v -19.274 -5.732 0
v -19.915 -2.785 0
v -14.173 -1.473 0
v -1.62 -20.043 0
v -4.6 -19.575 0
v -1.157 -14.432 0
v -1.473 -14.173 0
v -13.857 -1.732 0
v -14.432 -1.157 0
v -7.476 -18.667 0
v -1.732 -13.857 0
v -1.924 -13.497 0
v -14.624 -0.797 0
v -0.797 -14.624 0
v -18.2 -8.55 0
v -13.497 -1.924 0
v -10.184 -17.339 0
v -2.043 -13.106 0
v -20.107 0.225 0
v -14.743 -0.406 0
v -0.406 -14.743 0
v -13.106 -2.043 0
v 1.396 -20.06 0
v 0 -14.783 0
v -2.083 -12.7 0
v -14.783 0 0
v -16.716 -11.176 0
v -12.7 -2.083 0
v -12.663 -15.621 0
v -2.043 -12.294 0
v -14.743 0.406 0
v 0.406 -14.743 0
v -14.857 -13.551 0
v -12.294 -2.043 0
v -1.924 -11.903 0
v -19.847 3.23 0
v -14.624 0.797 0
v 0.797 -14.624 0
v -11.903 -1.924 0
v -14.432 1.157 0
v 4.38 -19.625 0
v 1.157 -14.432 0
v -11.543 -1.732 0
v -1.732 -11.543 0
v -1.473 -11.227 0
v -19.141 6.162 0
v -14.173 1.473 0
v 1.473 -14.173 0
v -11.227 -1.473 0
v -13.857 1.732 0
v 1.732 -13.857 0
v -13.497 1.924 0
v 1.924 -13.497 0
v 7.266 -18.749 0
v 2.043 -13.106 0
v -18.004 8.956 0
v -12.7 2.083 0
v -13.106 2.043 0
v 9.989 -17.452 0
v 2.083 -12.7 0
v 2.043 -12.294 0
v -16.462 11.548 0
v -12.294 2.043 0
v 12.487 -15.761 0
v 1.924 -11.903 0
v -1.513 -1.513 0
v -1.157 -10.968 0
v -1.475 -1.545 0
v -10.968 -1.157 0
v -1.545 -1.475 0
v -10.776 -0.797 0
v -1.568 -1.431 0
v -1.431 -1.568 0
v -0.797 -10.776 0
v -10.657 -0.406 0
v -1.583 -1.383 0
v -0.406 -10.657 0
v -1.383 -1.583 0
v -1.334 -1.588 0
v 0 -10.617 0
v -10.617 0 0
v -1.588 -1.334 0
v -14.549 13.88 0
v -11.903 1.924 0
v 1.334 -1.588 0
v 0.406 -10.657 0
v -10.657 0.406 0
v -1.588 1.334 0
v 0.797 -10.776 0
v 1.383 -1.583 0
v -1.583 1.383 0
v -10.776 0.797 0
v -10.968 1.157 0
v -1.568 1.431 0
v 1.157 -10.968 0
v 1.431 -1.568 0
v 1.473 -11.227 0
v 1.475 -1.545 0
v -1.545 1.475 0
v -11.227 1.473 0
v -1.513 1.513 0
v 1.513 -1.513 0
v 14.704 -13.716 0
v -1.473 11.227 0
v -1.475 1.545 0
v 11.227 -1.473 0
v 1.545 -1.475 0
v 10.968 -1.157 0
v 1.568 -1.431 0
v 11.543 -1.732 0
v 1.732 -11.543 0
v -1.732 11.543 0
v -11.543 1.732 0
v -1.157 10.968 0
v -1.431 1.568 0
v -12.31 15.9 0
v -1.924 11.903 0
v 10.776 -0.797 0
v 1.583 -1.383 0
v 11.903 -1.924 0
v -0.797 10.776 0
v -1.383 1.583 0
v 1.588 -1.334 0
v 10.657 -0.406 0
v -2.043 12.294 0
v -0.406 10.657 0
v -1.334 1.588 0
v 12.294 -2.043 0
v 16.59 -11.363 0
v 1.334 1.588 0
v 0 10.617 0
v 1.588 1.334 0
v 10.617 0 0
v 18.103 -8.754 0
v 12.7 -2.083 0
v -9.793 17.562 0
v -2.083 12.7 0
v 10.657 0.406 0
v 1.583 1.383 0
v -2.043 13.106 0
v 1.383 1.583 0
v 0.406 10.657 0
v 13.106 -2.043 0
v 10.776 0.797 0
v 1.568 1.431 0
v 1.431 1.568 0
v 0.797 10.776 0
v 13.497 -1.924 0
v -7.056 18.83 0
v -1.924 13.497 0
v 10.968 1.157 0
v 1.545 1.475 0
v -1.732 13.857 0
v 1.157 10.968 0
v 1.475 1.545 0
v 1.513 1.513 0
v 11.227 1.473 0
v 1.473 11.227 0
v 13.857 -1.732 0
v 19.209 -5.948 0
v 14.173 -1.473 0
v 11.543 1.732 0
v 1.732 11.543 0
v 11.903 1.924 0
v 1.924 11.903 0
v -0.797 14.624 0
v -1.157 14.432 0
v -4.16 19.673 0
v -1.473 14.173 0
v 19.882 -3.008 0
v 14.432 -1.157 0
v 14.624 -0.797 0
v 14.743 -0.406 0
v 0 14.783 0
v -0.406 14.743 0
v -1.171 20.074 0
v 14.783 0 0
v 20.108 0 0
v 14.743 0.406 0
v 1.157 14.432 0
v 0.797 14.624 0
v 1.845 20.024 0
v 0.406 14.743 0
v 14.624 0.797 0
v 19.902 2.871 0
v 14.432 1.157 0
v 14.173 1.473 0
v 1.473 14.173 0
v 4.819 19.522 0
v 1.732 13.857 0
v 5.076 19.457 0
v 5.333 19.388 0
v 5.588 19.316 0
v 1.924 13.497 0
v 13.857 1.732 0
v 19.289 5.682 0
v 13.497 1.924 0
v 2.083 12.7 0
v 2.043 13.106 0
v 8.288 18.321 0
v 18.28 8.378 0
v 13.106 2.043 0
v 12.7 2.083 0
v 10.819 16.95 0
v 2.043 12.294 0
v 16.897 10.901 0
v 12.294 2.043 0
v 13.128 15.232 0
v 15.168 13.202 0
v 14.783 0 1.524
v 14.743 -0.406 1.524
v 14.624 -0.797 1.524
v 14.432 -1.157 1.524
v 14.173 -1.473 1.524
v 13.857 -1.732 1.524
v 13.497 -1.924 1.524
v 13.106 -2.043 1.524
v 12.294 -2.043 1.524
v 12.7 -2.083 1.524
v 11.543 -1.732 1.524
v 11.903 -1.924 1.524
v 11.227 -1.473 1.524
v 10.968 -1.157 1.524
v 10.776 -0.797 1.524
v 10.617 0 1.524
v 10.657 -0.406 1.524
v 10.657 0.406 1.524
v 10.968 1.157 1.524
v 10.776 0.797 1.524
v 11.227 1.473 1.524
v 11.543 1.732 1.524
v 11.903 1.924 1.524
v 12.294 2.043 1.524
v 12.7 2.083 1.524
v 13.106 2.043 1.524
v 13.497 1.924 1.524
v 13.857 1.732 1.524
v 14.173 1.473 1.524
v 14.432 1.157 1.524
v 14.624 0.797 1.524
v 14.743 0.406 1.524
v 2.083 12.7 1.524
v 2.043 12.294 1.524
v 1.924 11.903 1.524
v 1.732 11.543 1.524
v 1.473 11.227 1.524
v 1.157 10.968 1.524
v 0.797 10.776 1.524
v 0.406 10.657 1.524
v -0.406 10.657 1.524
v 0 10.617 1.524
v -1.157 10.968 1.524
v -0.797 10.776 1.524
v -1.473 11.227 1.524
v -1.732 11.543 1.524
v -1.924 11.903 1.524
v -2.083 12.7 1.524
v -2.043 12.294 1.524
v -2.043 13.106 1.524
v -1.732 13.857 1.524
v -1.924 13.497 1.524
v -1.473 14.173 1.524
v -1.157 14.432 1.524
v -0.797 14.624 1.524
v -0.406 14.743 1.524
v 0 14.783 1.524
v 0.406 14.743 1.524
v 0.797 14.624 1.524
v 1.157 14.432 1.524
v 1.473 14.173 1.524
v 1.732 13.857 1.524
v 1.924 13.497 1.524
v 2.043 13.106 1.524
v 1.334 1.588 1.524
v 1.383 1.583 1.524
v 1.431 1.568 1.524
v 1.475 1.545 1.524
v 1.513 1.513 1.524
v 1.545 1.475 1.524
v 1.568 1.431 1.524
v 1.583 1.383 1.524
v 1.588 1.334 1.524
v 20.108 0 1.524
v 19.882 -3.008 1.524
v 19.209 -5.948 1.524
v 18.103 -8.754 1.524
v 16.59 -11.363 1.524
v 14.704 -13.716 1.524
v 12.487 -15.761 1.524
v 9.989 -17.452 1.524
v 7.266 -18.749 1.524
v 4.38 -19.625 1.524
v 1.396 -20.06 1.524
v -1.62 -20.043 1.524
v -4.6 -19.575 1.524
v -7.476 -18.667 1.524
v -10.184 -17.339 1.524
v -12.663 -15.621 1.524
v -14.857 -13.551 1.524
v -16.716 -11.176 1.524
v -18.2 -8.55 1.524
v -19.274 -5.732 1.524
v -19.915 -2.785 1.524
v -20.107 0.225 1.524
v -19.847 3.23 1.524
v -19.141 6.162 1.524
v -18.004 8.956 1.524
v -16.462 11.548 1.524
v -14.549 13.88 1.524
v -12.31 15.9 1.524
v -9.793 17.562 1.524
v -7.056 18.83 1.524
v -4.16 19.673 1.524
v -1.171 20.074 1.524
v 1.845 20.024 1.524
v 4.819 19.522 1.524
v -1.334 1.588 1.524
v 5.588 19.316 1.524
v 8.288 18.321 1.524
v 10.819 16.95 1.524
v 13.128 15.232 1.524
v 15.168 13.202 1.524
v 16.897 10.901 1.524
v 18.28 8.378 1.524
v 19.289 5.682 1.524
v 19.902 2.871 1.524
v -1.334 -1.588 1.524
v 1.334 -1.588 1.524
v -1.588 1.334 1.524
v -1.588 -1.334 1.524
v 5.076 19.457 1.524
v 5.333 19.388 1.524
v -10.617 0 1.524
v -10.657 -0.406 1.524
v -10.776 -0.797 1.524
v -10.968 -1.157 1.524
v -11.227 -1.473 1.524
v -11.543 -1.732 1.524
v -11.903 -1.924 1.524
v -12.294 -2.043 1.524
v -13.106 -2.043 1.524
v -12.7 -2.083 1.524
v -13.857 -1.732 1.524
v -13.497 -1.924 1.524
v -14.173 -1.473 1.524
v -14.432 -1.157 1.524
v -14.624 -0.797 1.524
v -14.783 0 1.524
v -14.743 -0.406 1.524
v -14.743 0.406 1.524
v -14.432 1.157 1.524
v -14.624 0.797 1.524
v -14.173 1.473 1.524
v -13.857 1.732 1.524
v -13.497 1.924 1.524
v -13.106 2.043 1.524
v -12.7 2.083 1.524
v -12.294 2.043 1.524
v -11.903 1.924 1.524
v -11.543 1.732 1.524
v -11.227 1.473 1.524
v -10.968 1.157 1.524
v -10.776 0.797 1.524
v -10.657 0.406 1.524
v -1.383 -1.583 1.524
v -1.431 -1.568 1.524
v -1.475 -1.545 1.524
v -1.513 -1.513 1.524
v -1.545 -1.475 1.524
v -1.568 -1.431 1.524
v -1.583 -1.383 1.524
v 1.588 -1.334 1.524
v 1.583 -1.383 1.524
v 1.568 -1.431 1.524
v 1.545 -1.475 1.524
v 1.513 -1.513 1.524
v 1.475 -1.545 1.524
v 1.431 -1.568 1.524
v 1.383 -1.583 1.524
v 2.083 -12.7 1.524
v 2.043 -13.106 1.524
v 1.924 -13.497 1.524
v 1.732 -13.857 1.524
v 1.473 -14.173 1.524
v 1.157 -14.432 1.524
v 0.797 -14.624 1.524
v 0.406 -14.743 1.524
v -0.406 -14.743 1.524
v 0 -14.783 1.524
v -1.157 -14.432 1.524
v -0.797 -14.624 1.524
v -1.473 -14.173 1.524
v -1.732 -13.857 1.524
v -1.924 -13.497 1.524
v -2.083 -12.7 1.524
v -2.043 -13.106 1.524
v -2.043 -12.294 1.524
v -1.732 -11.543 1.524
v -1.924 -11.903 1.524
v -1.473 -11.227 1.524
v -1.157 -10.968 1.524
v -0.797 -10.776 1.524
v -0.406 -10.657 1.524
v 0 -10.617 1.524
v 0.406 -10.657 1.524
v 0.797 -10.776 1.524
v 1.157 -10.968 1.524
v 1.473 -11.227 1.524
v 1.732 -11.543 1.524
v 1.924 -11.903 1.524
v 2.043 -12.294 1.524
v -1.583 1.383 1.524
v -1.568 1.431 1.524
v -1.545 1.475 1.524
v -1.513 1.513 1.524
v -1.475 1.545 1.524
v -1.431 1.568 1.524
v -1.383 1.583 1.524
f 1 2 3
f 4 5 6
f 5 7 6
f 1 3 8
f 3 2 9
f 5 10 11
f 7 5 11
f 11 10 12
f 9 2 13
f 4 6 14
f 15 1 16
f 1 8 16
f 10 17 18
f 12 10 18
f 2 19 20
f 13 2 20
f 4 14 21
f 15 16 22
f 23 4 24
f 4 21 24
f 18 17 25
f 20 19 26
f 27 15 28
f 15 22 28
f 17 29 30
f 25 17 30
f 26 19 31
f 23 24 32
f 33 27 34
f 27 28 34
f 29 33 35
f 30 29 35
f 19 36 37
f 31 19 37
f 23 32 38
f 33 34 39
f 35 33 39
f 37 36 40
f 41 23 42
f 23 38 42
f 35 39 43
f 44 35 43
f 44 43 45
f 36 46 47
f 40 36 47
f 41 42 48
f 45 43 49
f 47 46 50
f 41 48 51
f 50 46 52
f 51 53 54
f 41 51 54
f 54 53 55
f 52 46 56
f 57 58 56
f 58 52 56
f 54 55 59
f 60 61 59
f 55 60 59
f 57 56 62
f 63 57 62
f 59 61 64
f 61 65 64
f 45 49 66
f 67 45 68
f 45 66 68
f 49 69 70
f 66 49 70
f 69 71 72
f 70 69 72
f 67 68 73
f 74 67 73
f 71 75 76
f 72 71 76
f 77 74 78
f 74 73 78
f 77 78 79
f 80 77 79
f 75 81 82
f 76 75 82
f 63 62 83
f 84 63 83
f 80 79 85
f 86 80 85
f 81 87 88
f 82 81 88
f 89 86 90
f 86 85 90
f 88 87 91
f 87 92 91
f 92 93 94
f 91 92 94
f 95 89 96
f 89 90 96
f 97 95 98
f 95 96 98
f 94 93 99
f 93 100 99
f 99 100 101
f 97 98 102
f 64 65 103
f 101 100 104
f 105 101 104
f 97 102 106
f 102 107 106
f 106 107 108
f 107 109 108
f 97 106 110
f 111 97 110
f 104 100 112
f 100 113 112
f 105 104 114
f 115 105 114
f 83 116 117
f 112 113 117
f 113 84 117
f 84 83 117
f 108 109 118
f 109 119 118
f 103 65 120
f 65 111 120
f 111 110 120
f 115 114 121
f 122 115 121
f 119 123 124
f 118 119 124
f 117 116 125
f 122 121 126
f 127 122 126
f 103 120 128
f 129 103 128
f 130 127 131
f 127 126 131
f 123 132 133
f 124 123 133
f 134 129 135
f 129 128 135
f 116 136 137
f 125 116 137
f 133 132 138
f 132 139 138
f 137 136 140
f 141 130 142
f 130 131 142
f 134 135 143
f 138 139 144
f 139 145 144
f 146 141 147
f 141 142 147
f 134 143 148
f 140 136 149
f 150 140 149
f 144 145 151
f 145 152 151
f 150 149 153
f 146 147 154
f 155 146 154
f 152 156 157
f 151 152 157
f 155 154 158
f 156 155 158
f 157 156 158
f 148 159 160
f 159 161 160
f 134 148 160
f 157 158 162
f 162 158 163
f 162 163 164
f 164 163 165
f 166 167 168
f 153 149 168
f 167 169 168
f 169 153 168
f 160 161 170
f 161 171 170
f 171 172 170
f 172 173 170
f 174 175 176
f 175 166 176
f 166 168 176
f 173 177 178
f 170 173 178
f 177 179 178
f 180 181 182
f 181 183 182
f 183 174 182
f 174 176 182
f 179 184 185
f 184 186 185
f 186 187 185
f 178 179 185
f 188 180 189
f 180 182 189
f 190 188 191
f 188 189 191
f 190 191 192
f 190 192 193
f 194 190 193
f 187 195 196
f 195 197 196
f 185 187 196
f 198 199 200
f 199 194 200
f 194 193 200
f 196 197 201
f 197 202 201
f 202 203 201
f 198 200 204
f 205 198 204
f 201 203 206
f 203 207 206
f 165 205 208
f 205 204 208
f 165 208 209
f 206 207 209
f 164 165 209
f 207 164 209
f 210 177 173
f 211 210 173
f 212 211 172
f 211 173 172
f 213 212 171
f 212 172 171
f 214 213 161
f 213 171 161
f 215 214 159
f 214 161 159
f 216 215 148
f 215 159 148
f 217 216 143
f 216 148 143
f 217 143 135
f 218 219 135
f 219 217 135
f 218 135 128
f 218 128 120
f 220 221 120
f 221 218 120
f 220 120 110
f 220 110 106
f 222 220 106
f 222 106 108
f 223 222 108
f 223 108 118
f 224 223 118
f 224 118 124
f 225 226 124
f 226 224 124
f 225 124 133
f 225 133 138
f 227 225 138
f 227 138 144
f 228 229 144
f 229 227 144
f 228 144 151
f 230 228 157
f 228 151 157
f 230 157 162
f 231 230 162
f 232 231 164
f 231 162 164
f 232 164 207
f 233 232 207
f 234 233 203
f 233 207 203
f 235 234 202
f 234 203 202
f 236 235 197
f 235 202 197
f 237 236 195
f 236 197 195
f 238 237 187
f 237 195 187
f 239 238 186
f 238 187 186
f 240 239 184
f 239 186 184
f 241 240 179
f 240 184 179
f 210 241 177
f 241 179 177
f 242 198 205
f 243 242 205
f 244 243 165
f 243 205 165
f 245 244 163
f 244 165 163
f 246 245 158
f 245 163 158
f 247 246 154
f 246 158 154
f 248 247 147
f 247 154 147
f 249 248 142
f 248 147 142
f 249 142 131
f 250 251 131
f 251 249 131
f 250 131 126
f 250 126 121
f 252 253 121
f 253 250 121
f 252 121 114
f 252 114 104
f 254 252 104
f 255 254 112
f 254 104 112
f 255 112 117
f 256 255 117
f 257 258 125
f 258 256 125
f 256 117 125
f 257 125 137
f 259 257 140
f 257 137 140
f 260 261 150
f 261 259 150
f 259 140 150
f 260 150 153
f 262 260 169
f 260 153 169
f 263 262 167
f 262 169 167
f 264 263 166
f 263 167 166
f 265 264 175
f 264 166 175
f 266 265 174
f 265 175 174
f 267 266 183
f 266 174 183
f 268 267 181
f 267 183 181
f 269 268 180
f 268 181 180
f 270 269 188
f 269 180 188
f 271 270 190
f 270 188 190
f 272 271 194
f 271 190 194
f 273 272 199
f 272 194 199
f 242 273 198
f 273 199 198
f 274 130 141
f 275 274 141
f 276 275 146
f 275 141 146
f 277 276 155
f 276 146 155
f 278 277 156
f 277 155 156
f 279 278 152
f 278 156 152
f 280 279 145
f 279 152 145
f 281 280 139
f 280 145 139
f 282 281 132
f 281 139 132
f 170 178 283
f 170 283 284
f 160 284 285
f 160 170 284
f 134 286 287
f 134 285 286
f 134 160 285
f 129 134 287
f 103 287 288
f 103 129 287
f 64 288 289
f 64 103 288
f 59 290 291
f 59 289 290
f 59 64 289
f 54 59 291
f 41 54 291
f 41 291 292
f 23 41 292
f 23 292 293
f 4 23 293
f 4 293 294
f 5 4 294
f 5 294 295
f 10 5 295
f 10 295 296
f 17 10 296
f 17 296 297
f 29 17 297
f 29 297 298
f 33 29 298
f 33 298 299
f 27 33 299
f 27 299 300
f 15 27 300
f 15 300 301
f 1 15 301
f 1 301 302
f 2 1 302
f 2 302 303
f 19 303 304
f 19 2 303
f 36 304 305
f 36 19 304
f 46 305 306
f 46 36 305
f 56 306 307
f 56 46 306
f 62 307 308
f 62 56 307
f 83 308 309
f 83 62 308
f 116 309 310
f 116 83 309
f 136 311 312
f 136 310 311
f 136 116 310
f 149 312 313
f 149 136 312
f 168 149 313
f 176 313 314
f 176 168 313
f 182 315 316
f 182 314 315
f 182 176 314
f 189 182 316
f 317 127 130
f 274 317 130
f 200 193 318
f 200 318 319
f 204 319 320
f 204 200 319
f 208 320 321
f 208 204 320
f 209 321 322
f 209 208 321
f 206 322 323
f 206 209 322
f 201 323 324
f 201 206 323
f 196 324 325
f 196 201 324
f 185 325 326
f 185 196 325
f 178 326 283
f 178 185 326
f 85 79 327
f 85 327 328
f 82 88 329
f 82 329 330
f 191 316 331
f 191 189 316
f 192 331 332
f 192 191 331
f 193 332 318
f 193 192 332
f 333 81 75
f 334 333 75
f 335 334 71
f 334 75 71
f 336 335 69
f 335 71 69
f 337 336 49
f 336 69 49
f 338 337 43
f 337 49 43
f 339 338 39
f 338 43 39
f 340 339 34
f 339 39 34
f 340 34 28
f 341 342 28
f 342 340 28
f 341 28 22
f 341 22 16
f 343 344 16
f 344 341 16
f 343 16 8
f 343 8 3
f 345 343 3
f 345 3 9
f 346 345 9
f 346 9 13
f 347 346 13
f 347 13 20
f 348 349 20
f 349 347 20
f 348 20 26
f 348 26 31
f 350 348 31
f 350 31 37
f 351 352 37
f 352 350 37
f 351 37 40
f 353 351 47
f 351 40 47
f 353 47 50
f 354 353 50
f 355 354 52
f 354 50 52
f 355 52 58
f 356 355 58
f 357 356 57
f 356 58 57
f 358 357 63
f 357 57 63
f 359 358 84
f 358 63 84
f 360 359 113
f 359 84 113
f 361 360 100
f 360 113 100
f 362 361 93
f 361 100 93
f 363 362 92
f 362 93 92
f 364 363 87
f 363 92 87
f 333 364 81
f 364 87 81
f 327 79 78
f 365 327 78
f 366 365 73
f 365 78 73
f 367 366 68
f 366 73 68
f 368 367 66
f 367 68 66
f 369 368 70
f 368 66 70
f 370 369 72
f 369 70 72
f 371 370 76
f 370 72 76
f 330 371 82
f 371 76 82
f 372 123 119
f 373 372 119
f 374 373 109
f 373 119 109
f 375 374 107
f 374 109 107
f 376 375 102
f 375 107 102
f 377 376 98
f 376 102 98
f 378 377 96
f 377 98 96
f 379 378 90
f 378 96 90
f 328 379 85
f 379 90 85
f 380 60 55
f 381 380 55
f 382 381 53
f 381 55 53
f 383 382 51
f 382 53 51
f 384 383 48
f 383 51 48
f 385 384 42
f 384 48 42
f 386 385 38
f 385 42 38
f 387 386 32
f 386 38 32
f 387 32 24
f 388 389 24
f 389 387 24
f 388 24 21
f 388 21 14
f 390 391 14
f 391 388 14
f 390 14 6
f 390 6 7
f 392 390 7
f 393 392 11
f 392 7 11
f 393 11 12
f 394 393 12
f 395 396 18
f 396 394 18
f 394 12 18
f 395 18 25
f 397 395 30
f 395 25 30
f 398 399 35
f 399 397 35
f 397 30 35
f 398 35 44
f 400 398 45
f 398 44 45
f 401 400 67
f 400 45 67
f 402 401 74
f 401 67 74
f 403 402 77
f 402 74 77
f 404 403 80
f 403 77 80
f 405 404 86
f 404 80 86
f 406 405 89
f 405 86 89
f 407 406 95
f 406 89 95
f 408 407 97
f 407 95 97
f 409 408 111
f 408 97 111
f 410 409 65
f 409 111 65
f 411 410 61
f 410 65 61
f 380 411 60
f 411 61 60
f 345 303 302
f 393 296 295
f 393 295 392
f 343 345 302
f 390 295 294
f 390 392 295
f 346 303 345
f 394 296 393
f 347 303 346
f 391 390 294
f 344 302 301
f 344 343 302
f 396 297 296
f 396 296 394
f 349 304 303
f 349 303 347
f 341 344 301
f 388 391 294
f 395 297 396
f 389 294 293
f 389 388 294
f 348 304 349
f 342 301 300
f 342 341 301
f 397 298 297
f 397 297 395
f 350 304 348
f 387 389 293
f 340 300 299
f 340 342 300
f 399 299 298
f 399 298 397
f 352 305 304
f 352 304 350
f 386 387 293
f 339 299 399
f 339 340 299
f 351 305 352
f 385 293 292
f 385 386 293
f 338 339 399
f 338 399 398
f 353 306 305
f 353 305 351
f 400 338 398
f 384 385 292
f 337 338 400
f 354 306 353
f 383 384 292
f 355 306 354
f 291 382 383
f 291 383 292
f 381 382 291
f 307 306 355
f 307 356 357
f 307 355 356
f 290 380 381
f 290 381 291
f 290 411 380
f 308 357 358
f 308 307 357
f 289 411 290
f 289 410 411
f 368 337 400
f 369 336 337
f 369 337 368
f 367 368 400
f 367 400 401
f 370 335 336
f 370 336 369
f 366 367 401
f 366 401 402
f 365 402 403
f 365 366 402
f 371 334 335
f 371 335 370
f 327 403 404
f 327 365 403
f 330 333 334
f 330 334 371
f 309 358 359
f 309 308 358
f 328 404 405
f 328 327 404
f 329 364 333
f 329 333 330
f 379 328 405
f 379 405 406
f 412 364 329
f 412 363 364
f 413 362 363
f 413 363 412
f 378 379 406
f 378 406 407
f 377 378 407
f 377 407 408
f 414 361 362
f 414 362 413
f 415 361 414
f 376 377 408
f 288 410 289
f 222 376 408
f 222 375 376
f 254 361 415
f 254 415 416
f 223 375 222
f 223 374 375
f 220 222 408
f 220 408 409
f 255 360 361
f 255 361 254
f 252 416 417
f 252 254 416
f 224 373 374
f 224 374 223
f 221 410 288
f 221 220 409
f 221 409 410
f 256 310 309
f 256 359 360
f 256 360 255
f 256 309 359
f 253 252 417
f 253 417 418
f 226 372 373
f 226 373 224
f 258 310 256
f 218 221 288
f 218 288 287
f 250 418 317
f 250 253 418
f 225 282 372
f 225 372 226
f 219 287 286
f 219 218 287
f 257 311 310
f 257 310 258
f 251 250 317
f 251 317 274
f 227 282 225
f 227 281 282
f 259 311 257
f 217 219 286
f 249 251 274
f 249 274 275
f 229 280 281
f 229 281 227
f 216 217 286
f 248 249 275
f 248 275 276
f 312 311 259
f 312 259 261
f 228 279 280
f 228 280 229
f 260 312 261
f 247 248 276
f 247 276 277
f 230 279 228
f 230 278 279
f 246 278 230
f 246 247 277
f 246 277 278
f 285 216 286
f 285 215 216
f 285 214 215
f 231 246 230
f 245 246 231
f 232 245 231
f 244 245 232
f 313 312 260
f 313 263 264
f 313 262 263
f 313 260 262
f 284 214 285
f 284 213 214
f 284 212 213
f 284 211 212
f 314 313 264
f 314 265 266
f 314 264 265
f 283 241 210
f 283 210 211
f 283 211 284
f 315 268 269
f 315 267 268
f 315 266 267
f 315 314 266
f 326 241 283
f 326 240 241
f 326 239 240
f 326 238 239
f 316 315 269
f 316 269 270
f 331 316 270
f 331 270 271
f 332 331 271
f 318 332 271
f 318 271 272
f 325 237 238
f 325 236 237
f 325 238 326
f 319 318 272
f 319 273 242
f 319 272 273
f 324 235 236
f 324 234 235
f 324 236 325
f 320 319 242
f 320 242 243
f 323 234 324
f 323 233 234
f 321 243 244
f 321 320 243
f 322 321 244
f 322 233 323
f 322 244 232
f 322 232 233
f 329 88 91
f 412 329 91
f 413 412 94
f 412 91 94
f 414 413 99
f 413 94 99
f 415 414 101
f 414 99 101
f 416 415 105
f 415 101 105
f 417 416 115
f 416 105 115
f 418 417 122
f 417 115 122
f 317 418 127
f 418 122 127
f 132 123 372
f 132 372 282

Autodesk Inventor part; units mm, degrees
ref_plane "YZ Plane" through (0, 0, 0) normal (1, 0, 0) x (0, 1, 0)
ref_plane "XZ Plane" through (0, 0, 0) normal (0, 1, 0) x (-1, 0, 0)
ref_plane "XY Plane" through (0, 0, 0) normal (0, 0, 1) x (1, 0, 0)
sketch "Sketch1" plane through (0, 0, 0) normal (0, 0, 1) x (1, 0, 0)
  circle A0 centre (0, 12.7) radius 2.0828
  circle A1 centre (12.7, 0) radius 2.0828
  circle A2 centre (0, -12.7) radius 2.0828
  circle A3 centre (-12.7, 0) radius 2.0828
  arc A4 (5.5881, 19.3163) -> (4.8187, 19.5224) centre (0, 0) ccw projected
  circle A5 centre (0, 0) radius 20.1083
  line L0 (-1.5875, 1.3335) -> (-1.5875, -1.3335)
  line L1 (-1.3335, -1.5875) -> (1.3335, -1.5875)
  line L2 (1.5875, -1.3335) -> (1.5875, 1.3335)
  arc A6 (1.5875, 1.3335) -> (1.3335, 1.5875) centre (1.3335, 1.3335) ccw
  arc A7 (-1.3335, 1.5875) -> (-1.5875, 1.3335) centre (-1.3335, 1.3335) ccw
  arc A8 (-1.5875, -1.3335) -> (-1.3335, -1.5875) centre (-1.3335, -1.3335) ccw
  arc A9 (1.3335, -1.5875) -> (1.5875, -1.3335) centre (1.3335, -1.3335) ccw
  line L3 (-1.3335, 1.5875) -> (1.3335, 1.5875)
  point P0 (0, 0)
  point P1 (5.5881, 19.3163)
  point P2 (1.5875, 1.5875)
  point P3 (1.5875, 0)
  point P4 (0, -1.5875)
  point P5 (0, 1.5875)
  point P6 (4.8187, 19.5224)
  dimension "halfLength" = 1.5875
  dimension "d16" = 1.5875
  dimension "d17" = 1.5875
  dimension "d18" = 1.5875
  dimension "d20" = 0.254
  dimension "d21" = 2.667
  dimension "d22" = 2.667
  dimension "d23" = 40.2167
  dimension "d24" = 4.1656
  dimension "d25" = 4.1656
  dimension "d26" = 4.1656
  dimension "d27" = 4.1656
extrude "Extrusion3" add sketch "Sketch1" along normal blind 1.524
equation "\"d16\" = halfLength"
equation "\"d17\" = halfLength"
equation "\"d18\" = d17"
equation "\"d21\" = 2 * halfLength - 2 * d20"
equation "\"d22\" = d21"
equation "\"d25\" = d24"
equation "\"d26\" = d24"
equation "\"d27\" = d24"
properties part number "HS adapter retainer"
